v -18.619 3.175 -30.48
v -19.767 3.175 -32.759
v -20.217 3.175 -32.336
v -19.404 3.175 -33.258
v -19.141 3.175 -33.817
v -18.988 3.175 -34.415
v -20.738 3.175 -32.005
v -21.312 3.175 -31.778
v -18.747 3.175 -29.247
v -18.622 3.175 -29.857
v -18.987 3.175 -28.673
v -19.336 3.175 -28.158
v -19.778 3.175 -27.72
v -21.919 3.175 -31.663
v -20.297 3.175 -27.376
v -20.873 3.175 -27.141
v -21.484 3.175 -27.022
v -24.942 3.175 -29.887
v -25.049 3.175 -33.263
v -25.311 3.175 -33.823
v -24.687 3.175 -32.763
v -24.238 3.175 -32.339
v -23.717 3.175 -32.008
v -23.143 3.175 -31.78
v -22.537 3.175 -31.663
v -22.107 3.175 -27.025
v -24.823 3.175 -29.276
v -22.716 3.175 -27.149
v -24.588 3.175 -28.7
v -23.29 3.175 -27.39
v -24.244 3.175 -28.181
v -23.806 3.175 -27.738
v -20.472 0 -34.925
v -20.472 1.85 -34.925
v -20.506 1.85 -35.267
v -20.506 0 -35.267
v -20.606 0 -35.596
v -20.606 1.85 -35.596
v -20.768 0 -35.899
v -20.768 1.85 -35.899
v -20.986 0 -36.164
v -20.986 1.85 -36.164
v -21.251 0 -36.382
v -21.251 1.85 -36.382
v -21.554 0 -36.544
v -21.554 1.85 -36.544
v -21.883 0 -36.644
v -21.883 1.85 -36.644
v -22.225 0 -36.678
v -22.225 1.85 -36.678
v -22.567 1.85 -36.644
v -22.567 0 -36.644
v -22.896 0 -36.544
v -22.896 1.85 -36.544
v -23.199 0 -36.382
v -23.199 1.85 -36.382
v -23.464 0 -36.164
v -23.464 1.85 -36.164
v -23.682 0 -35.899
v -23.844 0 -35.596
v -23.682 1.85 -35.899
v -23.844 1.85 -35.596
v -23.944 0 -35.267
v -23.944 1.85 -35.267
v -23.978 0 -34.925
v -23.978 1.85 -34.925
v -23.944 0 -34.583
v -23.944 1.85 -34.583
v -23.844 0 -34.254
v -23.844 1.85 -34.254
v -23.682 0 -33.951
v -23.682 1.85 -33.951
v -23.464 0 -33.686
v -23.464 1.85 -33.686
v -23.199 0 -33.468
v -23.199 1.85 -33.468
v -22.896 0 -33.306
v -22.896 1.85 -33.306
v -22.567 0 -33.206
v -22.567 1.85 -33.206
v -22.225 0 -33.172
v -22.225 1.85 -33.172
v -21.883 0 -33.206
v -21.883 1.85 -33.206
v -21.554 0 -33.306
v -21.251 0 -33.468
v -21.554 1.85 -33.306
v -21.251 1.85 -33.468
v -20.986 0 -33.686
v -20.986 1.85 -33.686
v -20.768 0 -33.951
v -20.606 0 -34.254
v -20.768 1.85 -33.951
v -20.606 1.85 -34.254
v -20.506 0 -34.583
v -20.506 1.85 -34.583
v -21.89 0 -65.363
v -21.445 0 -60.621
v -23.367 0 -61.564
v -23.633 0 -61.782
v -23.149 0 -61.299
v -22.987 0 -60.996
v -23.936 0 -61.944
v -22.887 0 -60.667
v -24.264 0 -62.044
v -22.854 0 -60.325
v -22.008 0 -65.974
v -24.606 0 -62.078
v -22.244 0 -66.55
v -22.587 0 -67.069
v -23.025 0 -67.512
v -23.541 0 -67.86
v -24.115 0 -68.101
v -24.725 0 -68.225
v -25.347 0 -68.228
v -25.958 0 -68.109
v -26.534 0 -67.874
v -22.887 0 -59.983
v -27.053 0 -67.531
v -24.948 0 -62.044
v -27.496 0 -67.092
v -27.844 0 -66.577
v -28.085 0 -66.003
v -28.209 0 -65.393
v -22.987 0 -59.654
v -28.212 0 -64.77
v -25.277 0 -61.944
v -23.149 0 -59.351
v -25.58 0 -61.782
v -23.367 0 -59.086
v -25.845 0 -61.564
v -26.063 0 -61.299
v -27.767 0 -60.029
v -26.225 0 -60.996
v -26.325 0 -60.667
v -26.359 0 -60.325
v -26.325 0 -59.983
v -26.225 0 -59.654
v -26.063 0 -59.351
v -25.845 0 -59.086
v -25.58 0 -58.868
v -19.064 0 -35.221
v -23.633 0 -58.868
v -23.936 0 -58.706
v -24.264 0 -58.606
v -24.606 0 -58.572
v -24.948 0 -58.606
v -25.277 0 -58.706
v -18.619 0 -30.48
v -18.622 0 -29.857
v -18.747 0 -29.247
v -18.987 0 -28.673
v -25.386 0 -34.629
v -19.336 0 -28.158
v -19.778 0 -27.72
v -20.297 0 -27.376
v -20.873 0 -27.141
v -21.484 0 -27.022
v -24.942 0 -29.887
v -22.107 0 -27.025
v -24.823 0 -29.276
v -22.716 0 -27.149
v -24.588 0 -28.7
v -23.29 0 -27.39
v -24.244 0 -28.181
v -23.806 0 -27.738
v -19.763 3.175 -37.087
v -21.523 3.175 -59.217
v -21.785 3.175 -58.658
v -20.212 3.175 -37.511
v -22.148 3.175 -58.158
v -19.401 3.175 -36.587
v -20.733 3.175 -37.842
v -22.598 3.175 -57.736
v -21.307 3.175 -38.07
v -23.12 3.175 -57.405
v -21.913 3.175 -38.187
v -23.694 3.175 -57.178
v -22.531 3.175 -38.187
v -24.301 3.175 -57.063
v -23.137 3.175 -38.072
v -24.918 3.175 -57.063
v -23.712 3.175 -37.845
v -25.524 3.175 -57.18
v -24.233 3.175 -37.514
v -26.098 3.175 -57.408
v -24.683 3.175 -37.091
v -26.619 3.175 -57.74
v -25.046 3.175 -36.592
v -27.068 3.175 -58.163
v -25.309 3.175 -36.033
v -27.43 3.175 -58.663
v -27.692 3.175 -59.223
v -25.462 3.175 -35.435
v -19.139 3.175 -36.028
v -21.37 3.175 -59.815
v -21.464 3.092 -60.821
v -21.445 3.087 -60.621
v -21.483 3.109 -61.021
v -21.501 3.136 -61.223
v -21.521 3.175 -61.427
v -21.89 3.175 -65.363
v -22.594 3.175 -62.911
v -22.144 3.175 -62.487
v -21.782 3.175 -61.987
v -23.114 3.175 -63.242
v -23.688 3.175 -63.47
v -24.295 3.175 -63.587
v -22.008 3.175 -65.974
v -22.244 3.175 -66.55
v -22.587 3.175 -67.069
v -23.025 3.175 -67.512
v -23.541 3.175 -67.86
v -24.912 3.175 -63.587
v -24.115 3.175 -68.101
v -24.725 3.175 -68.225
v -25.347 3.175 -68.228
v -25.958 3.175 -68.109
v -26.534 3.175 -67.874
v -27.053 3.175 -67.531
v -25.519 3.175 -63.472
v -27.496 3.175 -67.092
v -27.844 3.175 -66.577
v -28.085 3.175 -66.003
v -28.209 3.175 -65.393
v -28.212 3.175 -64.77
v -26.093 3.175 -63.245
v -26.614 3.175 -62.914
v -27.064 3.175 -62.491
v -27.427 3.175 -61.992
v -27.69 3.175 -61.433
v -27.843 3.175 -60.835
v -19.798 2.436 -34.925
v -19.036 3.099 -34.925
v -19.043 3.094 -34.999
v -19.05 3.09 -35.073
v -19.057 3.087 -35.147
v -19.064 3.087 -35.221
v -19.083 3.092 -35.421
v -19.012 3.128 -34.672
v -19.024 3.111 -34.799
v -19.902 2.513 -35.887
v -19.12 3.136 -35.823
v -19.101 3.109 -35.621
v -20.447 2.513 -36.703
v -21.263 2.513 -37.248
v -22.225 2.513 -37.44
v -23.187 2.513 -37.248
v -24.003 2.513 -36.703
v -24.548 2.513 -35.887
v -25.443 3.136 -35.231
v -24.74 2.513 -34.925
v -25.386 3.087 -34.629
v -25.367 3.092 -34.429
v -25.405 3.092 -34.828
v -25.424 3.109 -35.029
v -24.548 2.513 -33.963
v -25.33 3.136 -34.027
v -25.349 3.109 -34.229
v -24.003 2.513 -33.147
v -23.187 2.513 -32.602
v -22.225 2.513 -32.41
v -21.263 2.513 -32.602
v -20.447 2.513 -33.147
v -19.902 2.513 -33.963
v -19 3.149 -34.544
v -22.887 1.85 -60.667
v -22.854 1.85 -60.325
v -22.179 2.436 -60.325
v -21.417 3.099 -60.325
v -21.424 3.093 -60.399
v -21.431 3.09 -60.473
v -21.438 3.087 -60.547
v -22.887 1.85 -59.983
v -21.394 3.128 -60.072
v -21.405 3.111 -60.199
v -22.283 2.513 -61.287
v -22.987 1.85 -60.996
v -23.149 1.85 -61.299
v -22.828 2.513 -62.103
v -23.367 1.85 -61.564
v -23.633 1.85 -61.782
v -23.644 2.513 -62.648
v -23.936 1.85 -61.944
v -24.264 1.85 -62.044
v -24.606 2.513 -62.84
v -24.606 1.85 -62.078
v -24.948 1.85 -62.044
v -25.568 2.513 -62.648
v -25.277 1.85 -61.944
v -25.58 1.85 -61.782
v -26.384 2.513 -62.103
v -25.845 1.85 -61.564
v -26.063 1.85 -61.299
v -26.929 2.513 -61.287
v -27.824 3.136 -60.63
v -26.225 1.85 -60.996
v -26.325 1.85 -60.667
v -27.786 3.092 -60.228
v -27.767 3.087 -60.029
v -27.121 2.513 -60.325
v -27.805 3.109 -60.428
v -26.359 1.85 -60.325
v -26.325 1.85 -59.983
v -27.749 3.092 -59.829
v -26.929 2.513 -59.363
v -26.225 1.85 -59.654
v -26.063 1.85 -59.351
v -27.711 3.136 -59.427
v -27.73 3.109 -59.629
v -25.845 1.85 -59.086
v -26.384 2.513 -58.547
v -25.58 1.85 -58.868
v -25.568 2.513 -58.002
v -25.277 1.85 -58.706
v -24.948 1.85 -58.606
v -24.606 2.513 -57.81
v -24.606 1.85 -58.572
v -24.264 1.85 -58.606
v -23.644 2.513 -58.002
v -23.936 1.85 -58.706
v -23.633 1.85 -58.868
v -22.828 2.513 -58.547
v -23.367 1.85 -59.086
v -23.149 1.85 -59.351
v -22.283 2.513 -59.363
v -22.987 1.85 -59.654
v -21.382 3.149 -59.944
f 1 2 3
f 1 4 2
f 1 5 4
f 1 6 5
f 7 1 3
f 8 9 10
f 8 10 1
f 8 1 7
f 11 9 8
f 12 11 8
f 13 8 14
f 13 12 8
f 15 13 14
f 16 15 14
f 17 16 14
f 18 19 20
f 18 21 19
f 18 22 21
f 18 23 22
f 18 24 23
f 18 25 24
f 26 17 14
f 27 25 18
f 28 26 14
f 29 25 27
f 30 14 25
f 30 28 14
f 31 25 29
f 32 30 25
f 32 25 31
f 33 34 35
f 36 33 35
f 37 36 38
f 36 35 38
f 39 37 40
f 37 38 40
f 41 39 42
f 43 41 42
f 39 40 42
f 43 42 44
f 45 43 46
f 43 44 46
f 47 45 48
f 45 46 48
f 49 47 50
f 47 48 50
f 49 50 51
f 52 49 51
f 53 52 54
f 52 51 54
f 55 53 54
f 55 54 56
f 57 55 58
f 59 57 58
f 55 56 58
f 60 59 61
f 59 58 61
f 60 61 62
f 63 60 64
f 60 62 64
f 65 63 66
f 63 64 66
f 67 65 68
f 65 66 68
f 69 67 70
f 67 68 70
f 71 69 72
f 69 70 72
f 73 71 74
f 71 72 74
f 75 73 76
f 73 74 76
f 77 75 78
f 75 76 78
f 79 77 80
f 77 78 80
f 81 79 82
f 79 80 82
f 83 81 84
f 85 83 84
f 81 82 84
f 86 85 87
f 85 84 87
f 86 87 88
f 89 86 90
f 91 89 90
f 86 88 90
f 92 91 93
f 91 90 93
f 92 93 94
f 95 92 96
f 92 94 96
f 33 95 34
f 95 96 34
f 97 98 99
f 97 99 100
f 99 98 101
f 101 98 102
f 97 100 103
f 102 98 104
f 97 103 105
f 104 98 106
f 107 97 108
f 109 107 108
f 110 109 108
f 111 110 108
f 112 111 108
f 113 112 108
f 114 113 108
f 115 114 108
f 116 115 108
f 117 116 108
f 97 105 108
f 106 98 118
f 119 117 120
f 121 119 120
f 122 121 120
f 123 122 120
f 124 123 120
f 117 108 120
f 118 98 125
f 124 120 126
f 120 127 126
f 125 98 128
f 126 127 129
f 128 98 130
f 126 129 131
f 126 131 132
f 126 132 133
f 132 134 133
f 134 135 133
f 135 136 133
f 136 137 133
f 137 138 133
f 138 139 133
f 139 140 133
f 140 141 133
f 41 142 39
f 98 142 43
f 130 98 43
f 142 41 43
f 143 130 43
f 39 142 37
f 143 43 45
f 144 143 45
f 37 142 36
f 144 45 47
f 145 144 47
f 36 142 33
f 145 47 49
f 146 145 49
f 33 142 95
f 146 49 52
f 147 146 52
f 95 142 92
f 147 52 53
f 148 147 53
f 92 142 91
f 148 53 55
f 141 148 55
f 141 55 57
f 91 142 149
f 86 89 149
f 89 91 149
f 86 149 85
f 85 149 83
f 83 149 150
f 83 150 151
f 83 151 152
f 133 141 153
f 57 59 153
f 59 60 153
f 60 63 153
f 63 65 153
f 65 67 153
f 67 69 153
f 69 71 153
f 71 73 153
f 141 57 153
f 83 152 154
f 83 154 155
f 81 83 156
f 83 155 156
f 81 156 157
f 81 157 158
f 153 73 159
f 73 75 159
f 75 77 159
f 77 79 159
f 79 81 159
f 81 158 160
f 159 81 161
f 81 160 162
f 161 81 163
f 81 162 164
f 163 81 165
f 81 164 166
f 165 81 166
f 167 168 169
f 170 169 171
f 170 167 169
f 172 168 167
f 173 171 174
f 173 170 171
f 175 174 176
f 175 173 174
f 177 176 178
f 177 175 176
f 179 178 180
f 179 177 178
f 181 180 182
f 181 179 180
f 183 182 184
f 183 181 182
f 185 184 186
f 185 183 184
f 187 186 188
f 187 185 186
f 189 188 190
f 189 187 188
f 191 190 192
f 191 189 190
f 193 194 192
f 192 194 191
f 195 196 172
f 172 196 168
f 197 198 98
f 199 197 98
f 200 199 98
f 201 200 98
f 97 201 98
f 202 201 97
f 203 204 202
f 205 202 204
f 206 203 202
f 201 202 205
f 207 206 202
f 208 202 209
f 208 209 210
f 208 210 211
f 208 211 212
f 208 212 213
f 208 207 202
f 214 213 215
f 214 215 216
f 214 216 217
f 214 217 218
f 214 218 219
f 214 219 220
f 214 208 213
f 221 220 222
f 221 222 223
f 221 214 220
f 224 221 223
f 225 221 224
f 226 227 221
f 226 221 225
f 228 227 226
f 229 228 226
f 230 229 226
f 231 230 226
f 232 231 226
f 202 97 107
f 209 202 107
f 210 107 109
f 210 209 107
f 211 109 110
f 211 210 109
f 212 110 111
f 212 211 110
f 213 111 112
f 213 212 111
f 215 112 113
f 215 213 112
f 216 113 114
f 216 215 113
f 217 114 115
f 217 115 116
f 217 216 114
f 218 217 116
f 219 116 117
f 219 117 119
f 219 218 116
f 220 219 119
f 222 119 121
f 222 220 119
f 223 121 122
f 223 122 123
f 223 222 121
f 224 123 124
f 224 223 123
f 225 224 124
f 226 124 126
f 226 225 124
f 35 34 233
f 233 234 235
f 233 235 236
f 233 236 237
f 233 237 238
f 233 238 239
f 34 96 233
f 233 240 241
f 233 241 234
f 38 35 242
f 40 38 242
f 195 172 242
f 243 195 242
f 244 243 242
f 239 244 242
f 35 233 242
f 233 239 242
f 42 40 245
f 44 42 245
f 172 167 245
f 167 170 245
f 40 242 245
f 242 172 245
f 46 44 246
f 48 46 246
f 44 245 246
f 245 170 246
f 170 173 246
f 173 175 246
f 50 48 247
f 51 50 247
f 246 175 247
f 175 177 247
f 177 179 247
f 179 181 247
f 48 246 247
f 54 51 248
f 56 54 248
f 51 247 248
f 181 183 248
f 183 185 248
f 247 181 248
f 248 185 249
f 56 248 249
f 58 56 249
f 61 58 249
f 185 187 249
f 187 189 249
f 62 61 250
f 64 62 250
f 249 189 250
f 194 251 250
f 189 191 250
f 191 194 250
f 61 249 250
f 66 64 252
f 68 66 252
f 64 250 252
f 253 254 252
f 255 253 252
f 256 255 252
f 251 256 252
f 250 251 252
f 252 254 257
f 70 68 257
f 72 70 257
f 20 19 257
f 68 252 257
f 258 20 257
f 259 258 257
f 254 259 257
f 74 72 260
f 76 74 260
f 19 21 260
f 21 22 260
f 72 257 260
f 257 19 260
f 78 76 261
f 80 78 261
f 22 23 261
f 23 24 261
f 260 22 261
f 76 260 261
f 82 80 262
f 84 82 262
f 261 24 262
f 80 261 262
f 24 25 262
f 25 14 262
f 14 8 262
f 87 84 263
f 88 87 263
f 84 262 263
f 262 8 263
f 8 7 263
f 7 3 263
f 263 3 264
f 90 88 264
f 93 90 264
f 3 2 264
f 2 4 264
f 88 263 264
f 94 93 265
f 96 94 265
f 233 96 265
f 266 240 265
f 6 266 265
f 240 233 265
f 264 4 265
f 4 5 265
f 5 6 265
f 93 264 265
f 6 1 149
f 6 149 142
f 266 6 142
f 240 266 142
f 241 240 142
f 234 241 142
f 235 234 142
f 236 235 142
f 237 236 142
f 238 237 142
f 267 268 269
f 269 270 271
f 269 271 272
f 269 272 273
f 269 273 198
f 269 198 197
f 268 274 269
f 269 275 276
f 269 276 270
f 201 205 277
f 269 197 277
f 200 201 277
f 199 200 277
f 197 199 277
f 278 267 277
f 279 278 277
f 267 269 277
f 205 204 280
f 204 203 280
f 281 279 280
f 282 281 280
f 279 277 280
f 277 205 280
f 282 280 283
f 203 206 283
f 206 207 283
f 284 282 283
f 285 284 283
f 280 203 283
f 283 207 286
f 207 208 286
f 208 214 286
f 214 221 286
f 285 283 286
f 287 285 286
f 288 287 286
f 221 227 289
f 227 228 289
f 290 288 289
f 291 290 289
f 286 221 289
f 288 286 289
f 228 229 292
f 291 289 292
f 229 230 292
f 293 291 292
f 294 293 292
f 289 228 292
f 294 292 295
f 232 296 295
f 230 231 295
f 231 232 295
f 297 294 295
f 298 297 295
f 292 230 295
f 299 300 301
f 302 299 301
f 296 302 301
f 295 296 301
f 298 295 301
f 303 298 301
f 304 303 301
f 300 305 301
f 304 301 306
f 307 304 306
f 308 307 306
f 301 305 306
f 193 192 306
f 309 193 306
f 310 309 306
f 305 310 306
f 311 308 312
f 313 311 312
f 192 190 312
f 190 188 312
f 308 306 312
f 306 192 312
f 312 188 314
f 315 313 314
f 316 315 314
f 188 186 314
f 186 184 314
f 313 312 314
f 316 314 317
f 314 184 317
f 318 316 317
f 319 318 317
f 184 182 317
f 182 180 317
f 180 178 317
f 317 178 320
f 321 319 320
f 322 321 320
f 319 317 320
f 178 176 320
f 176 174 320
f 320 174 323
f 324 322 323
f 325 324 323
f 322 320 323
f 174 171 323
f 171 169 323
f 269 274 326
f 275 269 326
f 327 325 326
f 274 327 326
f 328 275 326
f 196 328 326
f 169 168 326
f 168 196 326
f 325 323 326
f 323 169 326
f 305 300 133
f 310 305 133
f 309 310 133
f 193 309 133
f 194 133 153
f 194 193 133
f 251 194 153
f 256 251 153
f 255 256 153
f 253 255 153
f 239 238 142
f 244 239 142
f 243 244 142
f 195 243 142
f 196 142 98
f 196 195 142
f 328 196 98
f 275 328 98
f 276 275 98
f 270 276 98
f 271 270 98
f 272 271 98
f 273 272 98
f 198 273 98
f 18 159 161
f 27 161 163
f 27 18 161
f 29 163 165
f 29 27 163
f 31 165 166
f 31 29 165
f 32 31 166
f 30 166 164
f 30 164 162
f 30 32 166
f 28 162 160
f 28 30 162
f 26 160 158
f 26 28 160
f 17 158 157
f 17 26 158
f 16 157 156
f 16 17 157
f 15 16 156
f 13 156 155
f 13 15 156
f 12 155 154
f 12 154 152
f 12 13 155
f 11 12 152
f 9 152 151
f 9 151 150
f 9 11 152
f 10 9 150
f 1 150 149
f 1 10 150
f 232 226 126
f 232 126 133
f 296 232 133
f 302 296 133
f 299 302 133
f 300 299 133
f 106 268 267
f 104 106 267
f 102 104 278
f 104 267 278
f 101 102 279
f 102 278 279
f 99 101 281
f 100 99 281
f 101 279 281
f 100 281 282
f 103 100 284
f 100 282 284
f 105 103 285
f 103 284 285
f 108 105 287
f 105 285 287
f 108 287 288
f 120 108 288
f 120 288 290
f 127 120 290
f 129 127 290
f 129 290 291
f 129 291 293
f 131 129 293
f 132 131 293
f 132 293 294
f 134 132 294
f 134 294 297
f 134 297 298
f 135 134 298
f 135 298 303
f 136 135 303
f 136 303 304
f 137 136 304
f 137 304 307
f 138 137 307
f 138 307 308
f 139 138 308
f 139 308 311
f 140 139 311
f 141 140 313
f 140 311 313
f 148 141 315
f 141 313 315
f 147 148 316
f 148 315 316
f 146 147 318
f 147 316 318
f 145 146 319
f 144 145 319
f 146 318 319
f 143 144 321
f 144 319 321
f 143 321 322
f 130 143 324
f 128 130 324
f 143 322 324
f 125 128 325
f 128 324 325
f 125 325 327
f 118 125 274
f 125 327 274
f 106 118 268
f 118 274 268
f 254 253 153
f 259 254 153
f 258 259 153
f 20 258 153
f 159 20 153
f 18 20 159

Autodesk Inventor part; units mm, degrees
ref_plane "YZ Plane" through (0, 0, 0) normal (1, 0, 0) x (0, 1, 0)
ref_plane "XZ Plane" through (0, 0, 0) normal (0, 1, 0) x (-1, 0, 0)
ref_plane "XY Plane" through (0, 0, 0) normal (0, 0, 1) x (1, 0, 0)
sketch "Sketch1" plane through (0, 0, 0) normal (0, 1, 0) x (-1, 0, 0)
  circle A0 centre (0, 0) radius 73.025
  line L0 (0, 0) -> (0, -73.025) construction
  line L1 (0, 0) -> (-12.6807, -71.9156)
  line L2 (0, 0) -> (12.6807, -71.9156)
  line L3 (0, 0) -> (72.3143, -10.1631)
  line L4 (0, 0) -> (64.4772, -34.2832)
  line L5 (0, 0) -> (32.0121, 65.6344)
  line L6 (0, 0) -> (52.5298, 50.7274)
  line L7 (0, 0) -> (-52.5298, 50.7274)
  line L8 (0, 0) -> (-32.0121, 65.6344)
  line L9 (0, 0) -> (-64.4772, -34.2832)
  line L10 (0, 0) -> (-72.3143, -10.1631)
  circle A1 centre (0, 0) radius 69.85
  arc A2 (4.7597, -69.6876) -> (-4.7597, -69.6876) centre (0, -69.85) ccw
  arc A3 (67.7477, -17.0079) -> (64.806, -26.0614) centre (66.4313, -21.5848) ccw
  arc A4 (37.1107, 59.1762) -> (44.8121, 53.5808) centre (41.0568, 56.5098) ccw
  arc A5 (-44.8121, 53.5808) -> (-37.1107, 59.1762) centre (-41.0568, 56.5098) ccw
  arc A6 (-64.806, -26.0614) -> (-67.7477, -17.0079) centre (-66.4313, -21.5848) ccw
  point P0 (61.6739, -32.7926)
  point P1 (69.1702, -9.7212)
  point P2 (50.2459, 48.5219)
  point P3 (30.6202, 62.7808)
  point P4 (-30.6202, 62.7808)
  point P5 (-50.2459, 48.5219)
  point P6 (-69.1702, -9.7212)
  point P7 (-61.6739, -32.7926)
  point P8 (-12.1293, -68.7888)
  point P9 (12.1293, -68.7888)
  point P10 (64.806, -26.0614)
  point P11 (67.7477, -17.0079)
  point P12 (44.8121, 53.5808)
  point P13 (37.1107, 59.1762)
  point P14 (-37.1107, 59.1762)
  point P15 (-67.7477, -17.0079)
  dimension "d0" = 146.05
  dimension "d1" = 10
  dimension "d4" = 360
  dimension "d6" = 3.175
  dimension "d10" = 9.525
  dimension "d13" = 360
extrude "Extrusion1" add sketch "Sketch1" along normal blind 3.175 contours A0 L3 A1 L6 | L5 A1 L8 A0 | A1 L3 L6 | L6 L5 A1 A4 | A0 L2 A1 L4 | A1 A3 L4 L3 | L5 L8 A1 | L2 A1 A2 L1 | L4 A1 L2 | L10 A1 L7 | L7 A1 A5 L8 | L1 A1 L9 | L9 A1 A6 L10 | A0 L1 A1 L2 | L7 A1 L10 A0 | L1 A0 L9 A1 | A2 A1
fillet "Fillet1" radius 1.5875 24 edges at (30.6202, 1.5875, 62.7808) (32.0121, 1.5875, 65.6344) (-30.6202, 1.5875, 62.7808) (-32.0121, 1.5875, 65.6344) (-52.5298, 1.5875, 50.7274) (-50.2459, 1.5875, 48.5219) (52.5298, 1.5875, 50.7274) (50.2459, 1.5875, 48.5219) (64.4772, 1.5875, -34.2832) (61.6739, 1.5875, -32.7926) (72.3143, 1.5875, -10.1631) (69.1702, 1.5875, -9.7212) (-72.3143, 1.5875, -10.1631) (-69.1702, 1.5875, -9.7212) (-64.4772, 1.5875, -34.2832) (-61.6739, 1.5875, -32.7926) (37.1107, 1.5875, 59.1762) (44.8121, 1.5875, 53.5808) (-44.8121, 1.5875, 53.5808) (-37.1107, 1.5875, 59.1762) (-64.806, 1.5875, -26.0614) (-67.7477, 1.5875, -17.0079) (67.7477, 1.5875, -17.0079) (64.806, 1.5875, -26.0614)
sketch "Sketch5" plane through (0, 3.175, 0) normal (0, 1, 0) x (1, 0, 0)
  line L0 (0, 0) -> (0, 65.0875) construction
  circle A0 centre (0, 50.8) radius 22.225 construction
  arc A1 (63.6995, 35.7075) -> (-63.6995, 35.7075) centre (0, 0) ccw projected
  circle A2 centre (0, 50.8) radius 12.5 construction
  circle A3 centre (-24.6062, 60.325) radius 1.7526
  circle A4 centre (-24.6062, 60.325) radius 3.175 construction
  circle A5 centre (-22.225, 34.925) radius 3.175 construction
  circle A6 centre (-22.225, 34.925) radius 1.7526
  circle A7 centre (24.6062, 60.325) radius 1.7526 construction
  circle A8 centre (24.6062, 60.325) radius 3.175 construction
  circle A9 centre (22.225, 34.925) radius 3.175 construction
  circle A10 centre (22.225, 34.925) radius 1.7526 construction
  arc A11 (-62.3874, 31.414) -> (-64.248, 27.4085) centre (0, 0) ccw projected
  arc A12 (63.6995, 35.7075) -> (-63.6995, 35.7075) centre (0, 0) ccw projected
  line L1 (-28.4451, 67.2572) -> (-25.3861, 34.6286) construction
  line L2 (-22.7046, 31.7864) -> (-3.3572, 28.83) construction
  line L3 (28.4451, 67.2572) -> (25.3861, 34.6286) construction
  line L4 (22.7046, 31.7864) -> (3.3572, 28.83) construction
  circle A13 centre (0, 50.8) radius 6.35 construction
  circle A14 centre (0, 0) radius 73.025
  line L5 (0, 50.8) -> (-8.8388, 59.6388) construction
  circle A15 centre (0, 50.8) radius 9.5 construction
  line L6 (0, 50.8) -> (6.7175, 57.5175) construction
  circle A16 centre (-8.8388, 59.6388) radius 1.5 construction
  circle A17 centre (6.7175, 57.5175) radius 1.5 construction
  circle A18 centre (8.8388, 41.9612) radius 1.5 construction
  circle A19 centre (-6.7175, 44.0825) radius 1.5 construction
  line L7 (-24.6062, 60.325) -> (-22.225, 34.925) construction
  line L8 (-27.7674, 60.0286) -> (-25.3861, 34.6286)
  line L9 (-19.0639, 35.2214) -> (-21.4451, 60.6214)
  arc A20 (-21.4451, 60.6214) -> (-27.7674, 60.0286) centre (-24.6062, 60.325) ccw
  arc A21 (-25.3861, 34.6286) -> (-19.0639, 35.2214) centre (-22.225, 34.925) ccw
  circle A22 centre (-22.225, 34.925) radius 4.7625 construction
  circle A23 centre (-24.6062, 60.325) radius 4.7625 construction
  line L10 (-21.7805, 30.1833) -> (-25.0508, 65.0667) construction
  line L11 (-18.6193, 30.4796) -> (-21.8896, 65.3631)
  line L12 (-28.2119, 64.7704) -> (-24.9416, 29.8869)
  arc A24 (-24.9416, 29.8869) -> (-18.6193, 30.4796) centre (-21.7805, 30.1833) ccw
  arc A25 (-21.8896, 65.3631) -> (-28.2119, 64.7704) centre (-25.0508, 65.0667) ccw
  point P0 (-63.6995, 35.7075)
  point P1 (-23.4156, 47.625)
  point P2 (-63.6995, 35.7075)
  point P3 (-23.4156, 47.625)
  point P4 (-28.3025, 67.3173)
  point P5 (-23.3151, 69.203)
  dimension "d39" = 25
  dimension "d40" = 44.45
  dimension "d78" = 19
  dimension "d100" = 9.525
  dimension "d101" = 9.525
  dimension "d41" = 3.5052
  dimension "d42" = 6.35
  dimension "d43" = 9.525
  dimension "d44" = 24.6062
  dimension "d45" = 6.35
  dimension "d46" = 3.5052
  dimension "d47" = 15.875
  dimension "d48" = 22.225
  dimension "d68" = 12.7
  dimension "d77" = 315
  dimension "d79" = 3
  dimension "d80" = 3
  dimension "d83" = 360
  dimension "d102" = 6.35
extrude "Extrusion3" cut sketch "Sketch5" against normal blind 25.4
chamfer "Chamfer2" distance 1.524 angle 41 2 edges at (-23.9776, 3.175, -34.925) (-26.3589, 3.175, -60.325)
equation "\"d45\" = d42"
equation "\"d46\" = d41"
properties part number "Top Plate" material "UHMW, White"
